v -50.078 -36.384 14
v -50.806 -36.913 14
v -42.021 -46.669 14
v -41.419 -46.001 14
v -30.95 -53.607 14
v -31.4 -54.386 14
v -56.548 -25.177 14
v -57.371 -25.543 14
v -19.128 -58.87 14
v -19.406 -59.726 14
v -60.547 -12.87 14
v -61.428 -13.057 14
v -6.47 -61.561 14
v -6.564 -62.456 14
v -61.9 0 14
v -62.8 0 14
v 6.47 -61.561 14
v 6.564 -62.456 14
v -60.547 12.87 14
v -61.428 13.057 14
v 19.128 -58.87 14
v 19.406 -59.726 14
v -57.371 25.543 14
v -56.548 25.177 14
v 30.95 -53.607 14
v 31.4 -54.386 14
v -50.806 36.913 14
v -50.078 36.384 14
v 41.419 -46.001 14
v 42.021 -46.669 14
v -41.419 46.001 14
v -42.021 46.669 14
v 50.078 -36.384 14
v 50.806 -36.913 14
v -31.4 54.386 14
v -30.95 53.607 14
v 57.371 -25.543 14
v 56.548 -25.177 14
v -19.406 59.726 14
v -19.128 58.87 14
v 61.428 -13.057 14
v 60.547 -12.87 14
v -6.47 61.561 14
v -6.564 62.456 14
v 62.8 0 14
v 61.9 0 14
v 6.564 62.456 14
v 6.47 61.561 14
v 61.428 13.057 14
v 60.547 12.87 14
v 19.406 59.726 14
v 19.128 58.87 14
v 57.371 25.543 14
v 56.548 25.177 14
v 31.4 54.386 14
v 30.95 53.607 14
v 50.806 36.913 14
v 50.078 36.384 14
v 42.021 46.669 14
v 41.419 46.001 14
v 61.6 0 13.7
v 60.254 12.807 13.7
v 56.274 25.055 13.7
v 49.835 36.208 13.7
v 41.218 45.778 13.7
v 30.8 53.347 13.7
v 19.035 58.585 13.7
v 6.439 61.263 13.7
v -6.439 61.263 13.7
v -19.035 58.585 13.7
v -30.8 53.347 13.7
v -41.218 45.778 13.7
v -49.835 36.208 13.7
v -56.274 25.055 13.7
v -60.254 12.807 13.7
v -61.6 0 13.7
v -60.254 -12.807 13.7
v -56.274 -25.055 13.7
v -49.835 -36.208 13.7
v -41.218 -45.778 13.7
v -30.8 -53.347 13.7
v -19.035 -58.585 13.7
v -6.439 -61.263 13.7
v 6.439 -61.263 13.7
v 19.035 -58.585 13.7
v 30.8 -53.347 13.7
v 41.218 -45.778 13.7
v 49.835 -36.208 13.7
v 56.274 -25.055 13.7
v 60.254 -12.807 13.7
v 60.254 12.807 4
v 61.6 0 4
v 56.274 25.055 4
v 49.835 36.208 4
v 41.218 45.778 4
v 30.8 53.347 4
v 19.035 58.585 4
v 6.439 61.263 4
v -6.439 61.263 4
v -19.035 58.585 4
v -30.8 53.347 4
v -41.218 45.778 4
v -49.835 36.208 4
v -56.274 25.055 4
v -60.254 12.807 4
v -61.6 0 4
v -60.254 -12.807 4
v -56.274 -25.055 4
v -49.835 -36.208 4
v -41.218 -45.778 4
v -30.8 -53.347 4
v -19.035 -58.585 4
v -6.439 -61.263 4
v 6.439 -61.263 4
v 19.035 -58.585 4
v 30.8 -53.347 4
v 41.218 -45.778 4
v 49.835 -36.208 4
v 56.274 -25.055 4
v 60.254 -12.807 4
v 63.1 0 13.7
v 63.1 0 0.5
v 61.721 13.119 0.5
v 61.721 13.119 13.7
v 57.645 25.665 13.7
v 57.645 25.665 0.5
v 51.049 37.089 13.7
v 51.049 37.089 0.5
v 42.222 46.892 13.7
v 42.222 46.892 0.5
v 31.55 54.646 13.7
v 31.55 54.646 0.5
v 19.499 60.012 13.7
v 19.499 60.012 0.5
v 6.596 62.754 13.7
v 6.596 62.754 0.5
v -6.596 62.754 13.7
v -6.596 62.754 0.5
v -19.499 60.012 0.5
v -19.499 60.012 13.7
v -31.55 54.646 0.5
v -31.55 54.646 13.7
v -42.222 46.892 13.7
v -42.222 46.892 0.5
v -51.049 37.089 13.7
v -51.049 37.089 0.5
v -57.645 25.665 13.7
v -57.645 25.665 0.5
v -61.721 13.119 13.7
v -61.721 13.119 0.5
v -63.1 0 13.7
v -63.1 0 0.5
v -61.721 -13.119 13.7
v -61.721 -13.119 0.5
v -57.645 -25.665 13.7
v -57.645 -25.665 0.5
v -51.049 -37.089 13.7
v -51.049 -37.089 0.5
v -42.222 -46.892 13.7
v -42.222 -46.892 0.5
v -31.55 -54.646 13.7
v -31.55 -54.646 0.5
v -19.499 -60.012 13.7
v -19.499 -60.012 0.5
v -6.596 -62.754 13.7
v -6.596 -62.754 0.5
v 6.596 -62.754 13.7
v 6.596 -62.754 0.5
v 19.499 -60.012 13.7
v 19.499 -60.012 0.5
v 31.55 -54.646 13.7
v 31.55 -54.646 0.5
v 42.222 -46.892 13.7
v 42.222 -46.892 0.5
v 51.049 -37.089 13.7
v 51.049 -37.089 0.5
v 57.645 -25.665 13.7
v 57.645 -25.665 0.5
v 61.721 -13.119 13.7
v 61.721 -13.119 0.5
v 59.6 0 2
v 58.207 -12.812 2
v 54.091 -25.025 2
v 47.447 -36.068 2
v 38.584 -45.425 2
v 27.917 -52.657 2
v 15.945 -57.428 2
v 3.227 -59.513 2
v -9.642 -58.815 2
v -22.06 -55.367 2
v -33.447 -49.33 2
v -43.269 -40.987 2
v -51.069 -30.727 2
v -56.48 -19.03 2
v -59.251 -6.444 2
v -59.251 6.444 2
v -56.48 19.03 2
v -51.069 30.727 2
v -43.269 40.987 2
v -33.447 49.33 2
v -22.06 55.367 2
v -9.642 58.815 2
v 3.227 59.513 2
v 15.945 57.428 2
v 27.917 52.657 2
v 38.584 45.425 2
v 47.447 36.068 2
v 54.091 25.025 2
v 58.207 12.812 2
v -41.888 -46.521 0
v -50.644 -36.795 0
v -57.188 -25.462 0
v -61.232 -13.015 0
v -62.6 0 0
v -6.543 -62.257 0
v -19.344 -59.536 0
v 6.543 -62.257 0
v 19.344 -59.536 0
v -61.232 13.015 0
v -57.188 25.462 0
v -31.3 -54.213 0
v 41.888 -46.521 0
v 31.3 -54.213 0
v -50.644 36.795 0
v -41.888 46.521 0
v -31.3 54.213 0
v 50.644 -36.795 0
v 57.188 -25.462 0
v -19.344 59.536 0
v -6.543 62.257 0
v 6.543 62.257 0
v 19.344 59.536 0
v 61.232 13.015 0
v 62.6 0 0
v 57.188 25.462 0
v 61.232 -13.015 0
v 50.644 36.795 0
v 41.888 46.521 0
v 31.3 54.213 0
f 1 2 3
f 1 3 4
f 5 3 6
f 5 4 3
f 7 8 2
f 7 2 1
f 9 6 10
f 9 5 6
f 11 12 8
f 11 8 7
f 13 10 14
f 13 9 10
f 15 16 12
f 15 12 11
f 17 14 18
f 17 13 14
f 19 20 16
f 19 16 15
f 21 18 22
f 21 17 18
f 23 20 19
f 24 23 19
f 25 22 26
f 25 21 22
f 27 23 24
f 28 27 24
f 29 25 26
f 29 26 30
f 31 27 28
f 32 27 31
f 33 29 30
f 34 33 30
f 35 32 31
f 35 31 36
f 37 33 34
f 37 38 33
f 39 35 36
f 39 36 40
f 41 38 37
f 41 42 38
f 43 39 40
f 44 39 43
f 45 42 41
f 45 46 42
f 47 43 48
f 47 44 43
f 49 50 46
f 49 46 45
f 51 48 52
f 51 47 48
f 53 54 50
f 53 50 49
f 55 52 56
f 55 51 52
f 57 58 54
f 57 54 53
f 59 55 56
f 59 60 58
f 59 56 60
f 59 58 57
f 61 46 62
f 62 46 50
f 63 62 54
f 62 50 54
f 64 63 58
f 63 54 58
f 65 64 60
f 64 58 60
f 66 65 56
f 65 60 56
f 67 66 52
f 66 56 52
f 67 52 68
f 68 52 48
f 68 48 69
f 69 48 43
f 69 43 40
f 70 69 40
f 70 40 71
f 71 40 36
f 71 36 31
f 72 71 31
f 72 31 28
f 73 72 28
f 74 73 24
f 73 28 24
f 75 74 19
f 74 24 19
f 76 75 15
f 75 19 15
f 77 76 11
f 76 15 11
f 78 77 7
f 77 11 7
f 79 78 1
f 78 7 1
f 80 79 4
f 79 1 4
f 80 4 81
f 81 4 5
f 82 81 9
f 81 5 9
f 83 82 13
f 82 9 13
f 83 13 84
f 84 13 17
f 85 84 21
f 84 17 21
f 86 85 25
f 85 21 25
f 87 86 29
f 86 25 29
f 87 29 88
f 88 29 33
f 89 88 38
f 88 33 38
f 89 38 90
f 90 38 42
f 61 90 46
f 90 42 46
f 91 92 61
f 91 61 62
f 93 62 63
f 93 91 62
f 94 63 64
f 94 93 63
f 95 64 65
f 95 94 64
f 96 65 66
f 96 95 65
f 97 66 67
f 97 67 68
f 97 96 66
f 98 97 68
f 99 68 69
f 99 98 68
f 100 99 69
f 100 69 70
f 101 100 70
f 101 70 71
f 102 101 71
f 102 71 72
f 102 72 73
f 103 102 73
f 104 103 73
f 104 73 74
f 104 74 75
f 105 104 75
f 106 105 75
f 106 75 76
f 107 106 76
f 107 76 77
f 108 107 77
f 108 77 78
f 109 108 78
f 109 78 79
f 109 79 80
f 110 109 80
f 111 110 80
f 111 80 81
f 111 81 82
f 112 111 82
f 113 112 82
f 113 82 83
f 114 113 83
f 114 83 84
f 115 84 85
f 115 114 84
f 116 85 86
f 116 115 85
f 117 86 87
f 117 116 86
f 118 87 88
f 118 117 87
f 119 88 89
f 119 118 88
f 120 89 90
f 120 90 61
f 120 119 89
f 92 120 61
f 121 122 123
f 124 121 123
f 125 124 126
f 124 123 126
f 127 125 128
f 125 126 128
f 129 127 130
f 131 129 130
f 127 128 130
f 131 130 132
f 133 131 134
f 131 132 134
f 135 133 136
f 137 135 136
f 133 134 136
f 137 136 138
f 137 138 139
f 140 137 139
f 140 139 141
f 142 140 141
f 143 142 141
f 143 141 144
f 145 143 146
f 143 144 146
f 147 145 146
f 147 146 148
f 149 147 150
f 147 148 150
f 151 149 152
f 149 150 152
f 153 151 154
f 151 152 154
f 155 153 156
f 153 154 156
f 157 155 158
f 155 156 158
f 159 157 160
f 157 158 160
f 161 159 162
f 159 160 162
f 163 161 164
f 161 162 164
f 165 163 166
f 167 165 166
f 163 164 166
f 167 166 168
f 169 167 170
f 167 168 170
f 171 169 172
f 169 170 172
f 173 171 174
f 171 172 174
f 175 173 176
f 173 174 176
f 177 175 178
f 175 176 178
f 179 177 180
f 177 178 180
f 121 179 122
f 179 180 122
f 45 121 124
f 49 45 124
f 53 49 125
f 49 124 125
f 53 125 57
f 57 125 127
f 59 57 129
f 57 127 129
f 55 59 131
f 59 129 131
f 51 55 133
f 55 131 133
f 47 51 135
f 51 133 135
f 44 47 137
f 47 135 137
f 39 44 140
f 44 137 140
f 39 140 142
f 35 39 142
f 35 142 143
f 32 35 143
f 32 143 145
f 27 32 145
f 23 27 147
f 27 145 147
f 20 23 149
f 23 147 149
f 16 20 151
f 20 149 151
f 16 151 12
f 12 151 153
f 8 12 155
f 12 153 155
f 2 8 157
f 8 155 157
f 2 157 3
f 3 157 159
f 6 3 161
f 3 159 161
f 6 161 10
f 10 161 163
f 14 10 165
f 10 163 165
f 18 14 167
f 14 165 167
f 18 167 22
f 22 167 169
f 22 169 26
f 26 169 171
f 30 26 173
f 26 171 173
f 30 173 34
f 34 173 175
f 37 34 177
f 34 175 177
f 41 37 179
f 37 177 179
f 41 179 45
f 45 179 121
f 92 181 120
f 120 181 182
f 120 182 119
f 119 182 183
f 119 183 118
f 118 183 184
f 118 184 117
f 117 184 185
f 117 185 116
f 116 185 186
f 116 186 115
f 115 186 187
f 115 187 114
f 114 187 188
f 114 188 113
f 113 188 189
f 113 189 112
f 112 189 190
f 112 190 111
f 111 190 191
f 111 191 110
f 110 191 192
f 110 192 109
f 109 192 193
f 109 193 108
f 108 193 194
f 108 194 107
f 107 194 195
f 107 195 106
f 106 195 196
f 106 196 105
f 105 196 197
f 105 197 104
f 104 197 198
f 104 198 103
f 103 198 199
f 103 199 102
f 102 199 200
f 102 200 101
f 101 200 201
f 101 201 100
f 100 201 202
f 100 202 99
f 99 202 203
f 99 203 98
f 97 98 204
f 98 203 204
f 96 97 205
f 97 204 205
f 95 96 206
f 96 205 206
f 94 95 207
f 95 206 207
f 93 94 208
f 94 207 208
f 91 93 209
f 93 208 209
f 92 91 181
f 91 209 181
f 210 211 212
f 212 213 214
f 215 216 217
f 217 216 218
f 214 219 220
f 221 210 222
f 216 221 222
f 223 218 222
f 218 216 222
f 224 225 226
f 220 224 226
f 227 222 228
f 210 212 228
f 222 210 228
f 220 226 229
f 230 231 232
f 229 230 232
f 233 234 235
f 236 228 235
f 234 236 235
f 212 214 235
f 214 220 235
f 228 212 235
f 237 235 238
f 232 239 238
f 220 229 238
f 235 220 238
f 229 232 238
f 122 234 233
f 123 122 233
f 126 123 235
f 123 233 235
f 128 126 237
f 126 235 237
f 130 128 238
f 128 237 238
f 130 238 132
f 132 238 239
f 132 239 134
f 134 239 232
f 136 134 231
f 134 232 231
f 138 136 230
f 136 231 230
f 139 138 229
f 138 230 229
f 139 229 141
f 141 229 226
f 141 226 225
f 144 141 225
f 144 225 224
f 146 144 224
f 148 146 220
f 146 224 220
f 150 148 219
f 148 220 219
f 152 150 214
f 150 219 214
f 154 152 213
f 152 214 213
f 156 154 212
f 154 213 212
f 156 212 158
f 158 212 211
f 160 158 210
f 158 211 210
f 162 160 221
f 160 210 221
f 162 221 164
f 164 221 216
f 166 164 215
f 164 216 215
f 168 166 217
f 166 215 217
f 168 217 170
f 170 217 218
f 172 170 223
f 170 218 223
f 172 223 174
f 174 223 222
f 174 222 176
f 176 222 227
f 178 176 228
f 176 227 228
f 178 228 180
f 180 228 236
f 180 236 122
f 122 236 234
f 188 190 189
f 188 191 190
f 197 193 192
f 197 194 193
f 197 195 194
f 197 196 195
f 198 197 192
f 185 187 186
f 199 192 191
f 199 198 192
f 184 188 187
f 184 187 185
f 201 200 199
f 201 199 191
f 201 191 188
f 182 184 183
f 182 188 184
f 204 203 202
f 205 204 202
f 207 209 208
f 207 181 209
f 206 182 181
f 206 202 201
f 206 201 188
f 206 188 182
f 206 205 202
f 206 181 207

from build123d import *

# Parameters (mm, degrees)
F0_R     = 63.1
F0_R_2   = 61.6
F1_DEPTH = 2
F2_DEPTH = 14
F3_SIZE  = 0.5
F4_SIZE  = 2
F5_SIZE  = 0.3


# Not quite as in the source:
# - a feature names something its author has since deleted; it is built from what else it names


with BuildPart() as f1:
    # F0 (on Top) → F1 (new body)
    with BuildSketch(Plane.XY):
        Circle(F0_R)
        Circle(F0_R_2, mode=Mode.SUBTRACT)
        Circle(F0_R_2)
    extrude(amount=F1_DEPTH)

    # F0 (on Top) → F2 (join)
    with BuildSketch(Plane.XY):
        Circle(F0_R)
        Circle(F0_R_2, mode=Mode.SUBTRACT)
    extrude(amount=F2_DEPTH)

    # F3
    f3_edges = [f1.edges().sort_by_distance(p)[0] for p in [
        (-63.1, 0, 0),
    ]]
    chamfer(f3_edges, length=F3_SIZE)

    # F4
    f4_edges = [f1.edges().sort_by_distance(p)[0] for p in [
        (-61.6, 0, 2),
    ]]
    chamfer(f4_edges, length=F4_SIZE)

    # F5
    f5_edges = [f1.edges().sort_by_distance(p)[0] for p in [
        (-63.1, 0, 14),
        (-61.6, 0, 14),
    ]]
    chamfer(f5_edges, length=F5_SIZE)


solid = f1.part
